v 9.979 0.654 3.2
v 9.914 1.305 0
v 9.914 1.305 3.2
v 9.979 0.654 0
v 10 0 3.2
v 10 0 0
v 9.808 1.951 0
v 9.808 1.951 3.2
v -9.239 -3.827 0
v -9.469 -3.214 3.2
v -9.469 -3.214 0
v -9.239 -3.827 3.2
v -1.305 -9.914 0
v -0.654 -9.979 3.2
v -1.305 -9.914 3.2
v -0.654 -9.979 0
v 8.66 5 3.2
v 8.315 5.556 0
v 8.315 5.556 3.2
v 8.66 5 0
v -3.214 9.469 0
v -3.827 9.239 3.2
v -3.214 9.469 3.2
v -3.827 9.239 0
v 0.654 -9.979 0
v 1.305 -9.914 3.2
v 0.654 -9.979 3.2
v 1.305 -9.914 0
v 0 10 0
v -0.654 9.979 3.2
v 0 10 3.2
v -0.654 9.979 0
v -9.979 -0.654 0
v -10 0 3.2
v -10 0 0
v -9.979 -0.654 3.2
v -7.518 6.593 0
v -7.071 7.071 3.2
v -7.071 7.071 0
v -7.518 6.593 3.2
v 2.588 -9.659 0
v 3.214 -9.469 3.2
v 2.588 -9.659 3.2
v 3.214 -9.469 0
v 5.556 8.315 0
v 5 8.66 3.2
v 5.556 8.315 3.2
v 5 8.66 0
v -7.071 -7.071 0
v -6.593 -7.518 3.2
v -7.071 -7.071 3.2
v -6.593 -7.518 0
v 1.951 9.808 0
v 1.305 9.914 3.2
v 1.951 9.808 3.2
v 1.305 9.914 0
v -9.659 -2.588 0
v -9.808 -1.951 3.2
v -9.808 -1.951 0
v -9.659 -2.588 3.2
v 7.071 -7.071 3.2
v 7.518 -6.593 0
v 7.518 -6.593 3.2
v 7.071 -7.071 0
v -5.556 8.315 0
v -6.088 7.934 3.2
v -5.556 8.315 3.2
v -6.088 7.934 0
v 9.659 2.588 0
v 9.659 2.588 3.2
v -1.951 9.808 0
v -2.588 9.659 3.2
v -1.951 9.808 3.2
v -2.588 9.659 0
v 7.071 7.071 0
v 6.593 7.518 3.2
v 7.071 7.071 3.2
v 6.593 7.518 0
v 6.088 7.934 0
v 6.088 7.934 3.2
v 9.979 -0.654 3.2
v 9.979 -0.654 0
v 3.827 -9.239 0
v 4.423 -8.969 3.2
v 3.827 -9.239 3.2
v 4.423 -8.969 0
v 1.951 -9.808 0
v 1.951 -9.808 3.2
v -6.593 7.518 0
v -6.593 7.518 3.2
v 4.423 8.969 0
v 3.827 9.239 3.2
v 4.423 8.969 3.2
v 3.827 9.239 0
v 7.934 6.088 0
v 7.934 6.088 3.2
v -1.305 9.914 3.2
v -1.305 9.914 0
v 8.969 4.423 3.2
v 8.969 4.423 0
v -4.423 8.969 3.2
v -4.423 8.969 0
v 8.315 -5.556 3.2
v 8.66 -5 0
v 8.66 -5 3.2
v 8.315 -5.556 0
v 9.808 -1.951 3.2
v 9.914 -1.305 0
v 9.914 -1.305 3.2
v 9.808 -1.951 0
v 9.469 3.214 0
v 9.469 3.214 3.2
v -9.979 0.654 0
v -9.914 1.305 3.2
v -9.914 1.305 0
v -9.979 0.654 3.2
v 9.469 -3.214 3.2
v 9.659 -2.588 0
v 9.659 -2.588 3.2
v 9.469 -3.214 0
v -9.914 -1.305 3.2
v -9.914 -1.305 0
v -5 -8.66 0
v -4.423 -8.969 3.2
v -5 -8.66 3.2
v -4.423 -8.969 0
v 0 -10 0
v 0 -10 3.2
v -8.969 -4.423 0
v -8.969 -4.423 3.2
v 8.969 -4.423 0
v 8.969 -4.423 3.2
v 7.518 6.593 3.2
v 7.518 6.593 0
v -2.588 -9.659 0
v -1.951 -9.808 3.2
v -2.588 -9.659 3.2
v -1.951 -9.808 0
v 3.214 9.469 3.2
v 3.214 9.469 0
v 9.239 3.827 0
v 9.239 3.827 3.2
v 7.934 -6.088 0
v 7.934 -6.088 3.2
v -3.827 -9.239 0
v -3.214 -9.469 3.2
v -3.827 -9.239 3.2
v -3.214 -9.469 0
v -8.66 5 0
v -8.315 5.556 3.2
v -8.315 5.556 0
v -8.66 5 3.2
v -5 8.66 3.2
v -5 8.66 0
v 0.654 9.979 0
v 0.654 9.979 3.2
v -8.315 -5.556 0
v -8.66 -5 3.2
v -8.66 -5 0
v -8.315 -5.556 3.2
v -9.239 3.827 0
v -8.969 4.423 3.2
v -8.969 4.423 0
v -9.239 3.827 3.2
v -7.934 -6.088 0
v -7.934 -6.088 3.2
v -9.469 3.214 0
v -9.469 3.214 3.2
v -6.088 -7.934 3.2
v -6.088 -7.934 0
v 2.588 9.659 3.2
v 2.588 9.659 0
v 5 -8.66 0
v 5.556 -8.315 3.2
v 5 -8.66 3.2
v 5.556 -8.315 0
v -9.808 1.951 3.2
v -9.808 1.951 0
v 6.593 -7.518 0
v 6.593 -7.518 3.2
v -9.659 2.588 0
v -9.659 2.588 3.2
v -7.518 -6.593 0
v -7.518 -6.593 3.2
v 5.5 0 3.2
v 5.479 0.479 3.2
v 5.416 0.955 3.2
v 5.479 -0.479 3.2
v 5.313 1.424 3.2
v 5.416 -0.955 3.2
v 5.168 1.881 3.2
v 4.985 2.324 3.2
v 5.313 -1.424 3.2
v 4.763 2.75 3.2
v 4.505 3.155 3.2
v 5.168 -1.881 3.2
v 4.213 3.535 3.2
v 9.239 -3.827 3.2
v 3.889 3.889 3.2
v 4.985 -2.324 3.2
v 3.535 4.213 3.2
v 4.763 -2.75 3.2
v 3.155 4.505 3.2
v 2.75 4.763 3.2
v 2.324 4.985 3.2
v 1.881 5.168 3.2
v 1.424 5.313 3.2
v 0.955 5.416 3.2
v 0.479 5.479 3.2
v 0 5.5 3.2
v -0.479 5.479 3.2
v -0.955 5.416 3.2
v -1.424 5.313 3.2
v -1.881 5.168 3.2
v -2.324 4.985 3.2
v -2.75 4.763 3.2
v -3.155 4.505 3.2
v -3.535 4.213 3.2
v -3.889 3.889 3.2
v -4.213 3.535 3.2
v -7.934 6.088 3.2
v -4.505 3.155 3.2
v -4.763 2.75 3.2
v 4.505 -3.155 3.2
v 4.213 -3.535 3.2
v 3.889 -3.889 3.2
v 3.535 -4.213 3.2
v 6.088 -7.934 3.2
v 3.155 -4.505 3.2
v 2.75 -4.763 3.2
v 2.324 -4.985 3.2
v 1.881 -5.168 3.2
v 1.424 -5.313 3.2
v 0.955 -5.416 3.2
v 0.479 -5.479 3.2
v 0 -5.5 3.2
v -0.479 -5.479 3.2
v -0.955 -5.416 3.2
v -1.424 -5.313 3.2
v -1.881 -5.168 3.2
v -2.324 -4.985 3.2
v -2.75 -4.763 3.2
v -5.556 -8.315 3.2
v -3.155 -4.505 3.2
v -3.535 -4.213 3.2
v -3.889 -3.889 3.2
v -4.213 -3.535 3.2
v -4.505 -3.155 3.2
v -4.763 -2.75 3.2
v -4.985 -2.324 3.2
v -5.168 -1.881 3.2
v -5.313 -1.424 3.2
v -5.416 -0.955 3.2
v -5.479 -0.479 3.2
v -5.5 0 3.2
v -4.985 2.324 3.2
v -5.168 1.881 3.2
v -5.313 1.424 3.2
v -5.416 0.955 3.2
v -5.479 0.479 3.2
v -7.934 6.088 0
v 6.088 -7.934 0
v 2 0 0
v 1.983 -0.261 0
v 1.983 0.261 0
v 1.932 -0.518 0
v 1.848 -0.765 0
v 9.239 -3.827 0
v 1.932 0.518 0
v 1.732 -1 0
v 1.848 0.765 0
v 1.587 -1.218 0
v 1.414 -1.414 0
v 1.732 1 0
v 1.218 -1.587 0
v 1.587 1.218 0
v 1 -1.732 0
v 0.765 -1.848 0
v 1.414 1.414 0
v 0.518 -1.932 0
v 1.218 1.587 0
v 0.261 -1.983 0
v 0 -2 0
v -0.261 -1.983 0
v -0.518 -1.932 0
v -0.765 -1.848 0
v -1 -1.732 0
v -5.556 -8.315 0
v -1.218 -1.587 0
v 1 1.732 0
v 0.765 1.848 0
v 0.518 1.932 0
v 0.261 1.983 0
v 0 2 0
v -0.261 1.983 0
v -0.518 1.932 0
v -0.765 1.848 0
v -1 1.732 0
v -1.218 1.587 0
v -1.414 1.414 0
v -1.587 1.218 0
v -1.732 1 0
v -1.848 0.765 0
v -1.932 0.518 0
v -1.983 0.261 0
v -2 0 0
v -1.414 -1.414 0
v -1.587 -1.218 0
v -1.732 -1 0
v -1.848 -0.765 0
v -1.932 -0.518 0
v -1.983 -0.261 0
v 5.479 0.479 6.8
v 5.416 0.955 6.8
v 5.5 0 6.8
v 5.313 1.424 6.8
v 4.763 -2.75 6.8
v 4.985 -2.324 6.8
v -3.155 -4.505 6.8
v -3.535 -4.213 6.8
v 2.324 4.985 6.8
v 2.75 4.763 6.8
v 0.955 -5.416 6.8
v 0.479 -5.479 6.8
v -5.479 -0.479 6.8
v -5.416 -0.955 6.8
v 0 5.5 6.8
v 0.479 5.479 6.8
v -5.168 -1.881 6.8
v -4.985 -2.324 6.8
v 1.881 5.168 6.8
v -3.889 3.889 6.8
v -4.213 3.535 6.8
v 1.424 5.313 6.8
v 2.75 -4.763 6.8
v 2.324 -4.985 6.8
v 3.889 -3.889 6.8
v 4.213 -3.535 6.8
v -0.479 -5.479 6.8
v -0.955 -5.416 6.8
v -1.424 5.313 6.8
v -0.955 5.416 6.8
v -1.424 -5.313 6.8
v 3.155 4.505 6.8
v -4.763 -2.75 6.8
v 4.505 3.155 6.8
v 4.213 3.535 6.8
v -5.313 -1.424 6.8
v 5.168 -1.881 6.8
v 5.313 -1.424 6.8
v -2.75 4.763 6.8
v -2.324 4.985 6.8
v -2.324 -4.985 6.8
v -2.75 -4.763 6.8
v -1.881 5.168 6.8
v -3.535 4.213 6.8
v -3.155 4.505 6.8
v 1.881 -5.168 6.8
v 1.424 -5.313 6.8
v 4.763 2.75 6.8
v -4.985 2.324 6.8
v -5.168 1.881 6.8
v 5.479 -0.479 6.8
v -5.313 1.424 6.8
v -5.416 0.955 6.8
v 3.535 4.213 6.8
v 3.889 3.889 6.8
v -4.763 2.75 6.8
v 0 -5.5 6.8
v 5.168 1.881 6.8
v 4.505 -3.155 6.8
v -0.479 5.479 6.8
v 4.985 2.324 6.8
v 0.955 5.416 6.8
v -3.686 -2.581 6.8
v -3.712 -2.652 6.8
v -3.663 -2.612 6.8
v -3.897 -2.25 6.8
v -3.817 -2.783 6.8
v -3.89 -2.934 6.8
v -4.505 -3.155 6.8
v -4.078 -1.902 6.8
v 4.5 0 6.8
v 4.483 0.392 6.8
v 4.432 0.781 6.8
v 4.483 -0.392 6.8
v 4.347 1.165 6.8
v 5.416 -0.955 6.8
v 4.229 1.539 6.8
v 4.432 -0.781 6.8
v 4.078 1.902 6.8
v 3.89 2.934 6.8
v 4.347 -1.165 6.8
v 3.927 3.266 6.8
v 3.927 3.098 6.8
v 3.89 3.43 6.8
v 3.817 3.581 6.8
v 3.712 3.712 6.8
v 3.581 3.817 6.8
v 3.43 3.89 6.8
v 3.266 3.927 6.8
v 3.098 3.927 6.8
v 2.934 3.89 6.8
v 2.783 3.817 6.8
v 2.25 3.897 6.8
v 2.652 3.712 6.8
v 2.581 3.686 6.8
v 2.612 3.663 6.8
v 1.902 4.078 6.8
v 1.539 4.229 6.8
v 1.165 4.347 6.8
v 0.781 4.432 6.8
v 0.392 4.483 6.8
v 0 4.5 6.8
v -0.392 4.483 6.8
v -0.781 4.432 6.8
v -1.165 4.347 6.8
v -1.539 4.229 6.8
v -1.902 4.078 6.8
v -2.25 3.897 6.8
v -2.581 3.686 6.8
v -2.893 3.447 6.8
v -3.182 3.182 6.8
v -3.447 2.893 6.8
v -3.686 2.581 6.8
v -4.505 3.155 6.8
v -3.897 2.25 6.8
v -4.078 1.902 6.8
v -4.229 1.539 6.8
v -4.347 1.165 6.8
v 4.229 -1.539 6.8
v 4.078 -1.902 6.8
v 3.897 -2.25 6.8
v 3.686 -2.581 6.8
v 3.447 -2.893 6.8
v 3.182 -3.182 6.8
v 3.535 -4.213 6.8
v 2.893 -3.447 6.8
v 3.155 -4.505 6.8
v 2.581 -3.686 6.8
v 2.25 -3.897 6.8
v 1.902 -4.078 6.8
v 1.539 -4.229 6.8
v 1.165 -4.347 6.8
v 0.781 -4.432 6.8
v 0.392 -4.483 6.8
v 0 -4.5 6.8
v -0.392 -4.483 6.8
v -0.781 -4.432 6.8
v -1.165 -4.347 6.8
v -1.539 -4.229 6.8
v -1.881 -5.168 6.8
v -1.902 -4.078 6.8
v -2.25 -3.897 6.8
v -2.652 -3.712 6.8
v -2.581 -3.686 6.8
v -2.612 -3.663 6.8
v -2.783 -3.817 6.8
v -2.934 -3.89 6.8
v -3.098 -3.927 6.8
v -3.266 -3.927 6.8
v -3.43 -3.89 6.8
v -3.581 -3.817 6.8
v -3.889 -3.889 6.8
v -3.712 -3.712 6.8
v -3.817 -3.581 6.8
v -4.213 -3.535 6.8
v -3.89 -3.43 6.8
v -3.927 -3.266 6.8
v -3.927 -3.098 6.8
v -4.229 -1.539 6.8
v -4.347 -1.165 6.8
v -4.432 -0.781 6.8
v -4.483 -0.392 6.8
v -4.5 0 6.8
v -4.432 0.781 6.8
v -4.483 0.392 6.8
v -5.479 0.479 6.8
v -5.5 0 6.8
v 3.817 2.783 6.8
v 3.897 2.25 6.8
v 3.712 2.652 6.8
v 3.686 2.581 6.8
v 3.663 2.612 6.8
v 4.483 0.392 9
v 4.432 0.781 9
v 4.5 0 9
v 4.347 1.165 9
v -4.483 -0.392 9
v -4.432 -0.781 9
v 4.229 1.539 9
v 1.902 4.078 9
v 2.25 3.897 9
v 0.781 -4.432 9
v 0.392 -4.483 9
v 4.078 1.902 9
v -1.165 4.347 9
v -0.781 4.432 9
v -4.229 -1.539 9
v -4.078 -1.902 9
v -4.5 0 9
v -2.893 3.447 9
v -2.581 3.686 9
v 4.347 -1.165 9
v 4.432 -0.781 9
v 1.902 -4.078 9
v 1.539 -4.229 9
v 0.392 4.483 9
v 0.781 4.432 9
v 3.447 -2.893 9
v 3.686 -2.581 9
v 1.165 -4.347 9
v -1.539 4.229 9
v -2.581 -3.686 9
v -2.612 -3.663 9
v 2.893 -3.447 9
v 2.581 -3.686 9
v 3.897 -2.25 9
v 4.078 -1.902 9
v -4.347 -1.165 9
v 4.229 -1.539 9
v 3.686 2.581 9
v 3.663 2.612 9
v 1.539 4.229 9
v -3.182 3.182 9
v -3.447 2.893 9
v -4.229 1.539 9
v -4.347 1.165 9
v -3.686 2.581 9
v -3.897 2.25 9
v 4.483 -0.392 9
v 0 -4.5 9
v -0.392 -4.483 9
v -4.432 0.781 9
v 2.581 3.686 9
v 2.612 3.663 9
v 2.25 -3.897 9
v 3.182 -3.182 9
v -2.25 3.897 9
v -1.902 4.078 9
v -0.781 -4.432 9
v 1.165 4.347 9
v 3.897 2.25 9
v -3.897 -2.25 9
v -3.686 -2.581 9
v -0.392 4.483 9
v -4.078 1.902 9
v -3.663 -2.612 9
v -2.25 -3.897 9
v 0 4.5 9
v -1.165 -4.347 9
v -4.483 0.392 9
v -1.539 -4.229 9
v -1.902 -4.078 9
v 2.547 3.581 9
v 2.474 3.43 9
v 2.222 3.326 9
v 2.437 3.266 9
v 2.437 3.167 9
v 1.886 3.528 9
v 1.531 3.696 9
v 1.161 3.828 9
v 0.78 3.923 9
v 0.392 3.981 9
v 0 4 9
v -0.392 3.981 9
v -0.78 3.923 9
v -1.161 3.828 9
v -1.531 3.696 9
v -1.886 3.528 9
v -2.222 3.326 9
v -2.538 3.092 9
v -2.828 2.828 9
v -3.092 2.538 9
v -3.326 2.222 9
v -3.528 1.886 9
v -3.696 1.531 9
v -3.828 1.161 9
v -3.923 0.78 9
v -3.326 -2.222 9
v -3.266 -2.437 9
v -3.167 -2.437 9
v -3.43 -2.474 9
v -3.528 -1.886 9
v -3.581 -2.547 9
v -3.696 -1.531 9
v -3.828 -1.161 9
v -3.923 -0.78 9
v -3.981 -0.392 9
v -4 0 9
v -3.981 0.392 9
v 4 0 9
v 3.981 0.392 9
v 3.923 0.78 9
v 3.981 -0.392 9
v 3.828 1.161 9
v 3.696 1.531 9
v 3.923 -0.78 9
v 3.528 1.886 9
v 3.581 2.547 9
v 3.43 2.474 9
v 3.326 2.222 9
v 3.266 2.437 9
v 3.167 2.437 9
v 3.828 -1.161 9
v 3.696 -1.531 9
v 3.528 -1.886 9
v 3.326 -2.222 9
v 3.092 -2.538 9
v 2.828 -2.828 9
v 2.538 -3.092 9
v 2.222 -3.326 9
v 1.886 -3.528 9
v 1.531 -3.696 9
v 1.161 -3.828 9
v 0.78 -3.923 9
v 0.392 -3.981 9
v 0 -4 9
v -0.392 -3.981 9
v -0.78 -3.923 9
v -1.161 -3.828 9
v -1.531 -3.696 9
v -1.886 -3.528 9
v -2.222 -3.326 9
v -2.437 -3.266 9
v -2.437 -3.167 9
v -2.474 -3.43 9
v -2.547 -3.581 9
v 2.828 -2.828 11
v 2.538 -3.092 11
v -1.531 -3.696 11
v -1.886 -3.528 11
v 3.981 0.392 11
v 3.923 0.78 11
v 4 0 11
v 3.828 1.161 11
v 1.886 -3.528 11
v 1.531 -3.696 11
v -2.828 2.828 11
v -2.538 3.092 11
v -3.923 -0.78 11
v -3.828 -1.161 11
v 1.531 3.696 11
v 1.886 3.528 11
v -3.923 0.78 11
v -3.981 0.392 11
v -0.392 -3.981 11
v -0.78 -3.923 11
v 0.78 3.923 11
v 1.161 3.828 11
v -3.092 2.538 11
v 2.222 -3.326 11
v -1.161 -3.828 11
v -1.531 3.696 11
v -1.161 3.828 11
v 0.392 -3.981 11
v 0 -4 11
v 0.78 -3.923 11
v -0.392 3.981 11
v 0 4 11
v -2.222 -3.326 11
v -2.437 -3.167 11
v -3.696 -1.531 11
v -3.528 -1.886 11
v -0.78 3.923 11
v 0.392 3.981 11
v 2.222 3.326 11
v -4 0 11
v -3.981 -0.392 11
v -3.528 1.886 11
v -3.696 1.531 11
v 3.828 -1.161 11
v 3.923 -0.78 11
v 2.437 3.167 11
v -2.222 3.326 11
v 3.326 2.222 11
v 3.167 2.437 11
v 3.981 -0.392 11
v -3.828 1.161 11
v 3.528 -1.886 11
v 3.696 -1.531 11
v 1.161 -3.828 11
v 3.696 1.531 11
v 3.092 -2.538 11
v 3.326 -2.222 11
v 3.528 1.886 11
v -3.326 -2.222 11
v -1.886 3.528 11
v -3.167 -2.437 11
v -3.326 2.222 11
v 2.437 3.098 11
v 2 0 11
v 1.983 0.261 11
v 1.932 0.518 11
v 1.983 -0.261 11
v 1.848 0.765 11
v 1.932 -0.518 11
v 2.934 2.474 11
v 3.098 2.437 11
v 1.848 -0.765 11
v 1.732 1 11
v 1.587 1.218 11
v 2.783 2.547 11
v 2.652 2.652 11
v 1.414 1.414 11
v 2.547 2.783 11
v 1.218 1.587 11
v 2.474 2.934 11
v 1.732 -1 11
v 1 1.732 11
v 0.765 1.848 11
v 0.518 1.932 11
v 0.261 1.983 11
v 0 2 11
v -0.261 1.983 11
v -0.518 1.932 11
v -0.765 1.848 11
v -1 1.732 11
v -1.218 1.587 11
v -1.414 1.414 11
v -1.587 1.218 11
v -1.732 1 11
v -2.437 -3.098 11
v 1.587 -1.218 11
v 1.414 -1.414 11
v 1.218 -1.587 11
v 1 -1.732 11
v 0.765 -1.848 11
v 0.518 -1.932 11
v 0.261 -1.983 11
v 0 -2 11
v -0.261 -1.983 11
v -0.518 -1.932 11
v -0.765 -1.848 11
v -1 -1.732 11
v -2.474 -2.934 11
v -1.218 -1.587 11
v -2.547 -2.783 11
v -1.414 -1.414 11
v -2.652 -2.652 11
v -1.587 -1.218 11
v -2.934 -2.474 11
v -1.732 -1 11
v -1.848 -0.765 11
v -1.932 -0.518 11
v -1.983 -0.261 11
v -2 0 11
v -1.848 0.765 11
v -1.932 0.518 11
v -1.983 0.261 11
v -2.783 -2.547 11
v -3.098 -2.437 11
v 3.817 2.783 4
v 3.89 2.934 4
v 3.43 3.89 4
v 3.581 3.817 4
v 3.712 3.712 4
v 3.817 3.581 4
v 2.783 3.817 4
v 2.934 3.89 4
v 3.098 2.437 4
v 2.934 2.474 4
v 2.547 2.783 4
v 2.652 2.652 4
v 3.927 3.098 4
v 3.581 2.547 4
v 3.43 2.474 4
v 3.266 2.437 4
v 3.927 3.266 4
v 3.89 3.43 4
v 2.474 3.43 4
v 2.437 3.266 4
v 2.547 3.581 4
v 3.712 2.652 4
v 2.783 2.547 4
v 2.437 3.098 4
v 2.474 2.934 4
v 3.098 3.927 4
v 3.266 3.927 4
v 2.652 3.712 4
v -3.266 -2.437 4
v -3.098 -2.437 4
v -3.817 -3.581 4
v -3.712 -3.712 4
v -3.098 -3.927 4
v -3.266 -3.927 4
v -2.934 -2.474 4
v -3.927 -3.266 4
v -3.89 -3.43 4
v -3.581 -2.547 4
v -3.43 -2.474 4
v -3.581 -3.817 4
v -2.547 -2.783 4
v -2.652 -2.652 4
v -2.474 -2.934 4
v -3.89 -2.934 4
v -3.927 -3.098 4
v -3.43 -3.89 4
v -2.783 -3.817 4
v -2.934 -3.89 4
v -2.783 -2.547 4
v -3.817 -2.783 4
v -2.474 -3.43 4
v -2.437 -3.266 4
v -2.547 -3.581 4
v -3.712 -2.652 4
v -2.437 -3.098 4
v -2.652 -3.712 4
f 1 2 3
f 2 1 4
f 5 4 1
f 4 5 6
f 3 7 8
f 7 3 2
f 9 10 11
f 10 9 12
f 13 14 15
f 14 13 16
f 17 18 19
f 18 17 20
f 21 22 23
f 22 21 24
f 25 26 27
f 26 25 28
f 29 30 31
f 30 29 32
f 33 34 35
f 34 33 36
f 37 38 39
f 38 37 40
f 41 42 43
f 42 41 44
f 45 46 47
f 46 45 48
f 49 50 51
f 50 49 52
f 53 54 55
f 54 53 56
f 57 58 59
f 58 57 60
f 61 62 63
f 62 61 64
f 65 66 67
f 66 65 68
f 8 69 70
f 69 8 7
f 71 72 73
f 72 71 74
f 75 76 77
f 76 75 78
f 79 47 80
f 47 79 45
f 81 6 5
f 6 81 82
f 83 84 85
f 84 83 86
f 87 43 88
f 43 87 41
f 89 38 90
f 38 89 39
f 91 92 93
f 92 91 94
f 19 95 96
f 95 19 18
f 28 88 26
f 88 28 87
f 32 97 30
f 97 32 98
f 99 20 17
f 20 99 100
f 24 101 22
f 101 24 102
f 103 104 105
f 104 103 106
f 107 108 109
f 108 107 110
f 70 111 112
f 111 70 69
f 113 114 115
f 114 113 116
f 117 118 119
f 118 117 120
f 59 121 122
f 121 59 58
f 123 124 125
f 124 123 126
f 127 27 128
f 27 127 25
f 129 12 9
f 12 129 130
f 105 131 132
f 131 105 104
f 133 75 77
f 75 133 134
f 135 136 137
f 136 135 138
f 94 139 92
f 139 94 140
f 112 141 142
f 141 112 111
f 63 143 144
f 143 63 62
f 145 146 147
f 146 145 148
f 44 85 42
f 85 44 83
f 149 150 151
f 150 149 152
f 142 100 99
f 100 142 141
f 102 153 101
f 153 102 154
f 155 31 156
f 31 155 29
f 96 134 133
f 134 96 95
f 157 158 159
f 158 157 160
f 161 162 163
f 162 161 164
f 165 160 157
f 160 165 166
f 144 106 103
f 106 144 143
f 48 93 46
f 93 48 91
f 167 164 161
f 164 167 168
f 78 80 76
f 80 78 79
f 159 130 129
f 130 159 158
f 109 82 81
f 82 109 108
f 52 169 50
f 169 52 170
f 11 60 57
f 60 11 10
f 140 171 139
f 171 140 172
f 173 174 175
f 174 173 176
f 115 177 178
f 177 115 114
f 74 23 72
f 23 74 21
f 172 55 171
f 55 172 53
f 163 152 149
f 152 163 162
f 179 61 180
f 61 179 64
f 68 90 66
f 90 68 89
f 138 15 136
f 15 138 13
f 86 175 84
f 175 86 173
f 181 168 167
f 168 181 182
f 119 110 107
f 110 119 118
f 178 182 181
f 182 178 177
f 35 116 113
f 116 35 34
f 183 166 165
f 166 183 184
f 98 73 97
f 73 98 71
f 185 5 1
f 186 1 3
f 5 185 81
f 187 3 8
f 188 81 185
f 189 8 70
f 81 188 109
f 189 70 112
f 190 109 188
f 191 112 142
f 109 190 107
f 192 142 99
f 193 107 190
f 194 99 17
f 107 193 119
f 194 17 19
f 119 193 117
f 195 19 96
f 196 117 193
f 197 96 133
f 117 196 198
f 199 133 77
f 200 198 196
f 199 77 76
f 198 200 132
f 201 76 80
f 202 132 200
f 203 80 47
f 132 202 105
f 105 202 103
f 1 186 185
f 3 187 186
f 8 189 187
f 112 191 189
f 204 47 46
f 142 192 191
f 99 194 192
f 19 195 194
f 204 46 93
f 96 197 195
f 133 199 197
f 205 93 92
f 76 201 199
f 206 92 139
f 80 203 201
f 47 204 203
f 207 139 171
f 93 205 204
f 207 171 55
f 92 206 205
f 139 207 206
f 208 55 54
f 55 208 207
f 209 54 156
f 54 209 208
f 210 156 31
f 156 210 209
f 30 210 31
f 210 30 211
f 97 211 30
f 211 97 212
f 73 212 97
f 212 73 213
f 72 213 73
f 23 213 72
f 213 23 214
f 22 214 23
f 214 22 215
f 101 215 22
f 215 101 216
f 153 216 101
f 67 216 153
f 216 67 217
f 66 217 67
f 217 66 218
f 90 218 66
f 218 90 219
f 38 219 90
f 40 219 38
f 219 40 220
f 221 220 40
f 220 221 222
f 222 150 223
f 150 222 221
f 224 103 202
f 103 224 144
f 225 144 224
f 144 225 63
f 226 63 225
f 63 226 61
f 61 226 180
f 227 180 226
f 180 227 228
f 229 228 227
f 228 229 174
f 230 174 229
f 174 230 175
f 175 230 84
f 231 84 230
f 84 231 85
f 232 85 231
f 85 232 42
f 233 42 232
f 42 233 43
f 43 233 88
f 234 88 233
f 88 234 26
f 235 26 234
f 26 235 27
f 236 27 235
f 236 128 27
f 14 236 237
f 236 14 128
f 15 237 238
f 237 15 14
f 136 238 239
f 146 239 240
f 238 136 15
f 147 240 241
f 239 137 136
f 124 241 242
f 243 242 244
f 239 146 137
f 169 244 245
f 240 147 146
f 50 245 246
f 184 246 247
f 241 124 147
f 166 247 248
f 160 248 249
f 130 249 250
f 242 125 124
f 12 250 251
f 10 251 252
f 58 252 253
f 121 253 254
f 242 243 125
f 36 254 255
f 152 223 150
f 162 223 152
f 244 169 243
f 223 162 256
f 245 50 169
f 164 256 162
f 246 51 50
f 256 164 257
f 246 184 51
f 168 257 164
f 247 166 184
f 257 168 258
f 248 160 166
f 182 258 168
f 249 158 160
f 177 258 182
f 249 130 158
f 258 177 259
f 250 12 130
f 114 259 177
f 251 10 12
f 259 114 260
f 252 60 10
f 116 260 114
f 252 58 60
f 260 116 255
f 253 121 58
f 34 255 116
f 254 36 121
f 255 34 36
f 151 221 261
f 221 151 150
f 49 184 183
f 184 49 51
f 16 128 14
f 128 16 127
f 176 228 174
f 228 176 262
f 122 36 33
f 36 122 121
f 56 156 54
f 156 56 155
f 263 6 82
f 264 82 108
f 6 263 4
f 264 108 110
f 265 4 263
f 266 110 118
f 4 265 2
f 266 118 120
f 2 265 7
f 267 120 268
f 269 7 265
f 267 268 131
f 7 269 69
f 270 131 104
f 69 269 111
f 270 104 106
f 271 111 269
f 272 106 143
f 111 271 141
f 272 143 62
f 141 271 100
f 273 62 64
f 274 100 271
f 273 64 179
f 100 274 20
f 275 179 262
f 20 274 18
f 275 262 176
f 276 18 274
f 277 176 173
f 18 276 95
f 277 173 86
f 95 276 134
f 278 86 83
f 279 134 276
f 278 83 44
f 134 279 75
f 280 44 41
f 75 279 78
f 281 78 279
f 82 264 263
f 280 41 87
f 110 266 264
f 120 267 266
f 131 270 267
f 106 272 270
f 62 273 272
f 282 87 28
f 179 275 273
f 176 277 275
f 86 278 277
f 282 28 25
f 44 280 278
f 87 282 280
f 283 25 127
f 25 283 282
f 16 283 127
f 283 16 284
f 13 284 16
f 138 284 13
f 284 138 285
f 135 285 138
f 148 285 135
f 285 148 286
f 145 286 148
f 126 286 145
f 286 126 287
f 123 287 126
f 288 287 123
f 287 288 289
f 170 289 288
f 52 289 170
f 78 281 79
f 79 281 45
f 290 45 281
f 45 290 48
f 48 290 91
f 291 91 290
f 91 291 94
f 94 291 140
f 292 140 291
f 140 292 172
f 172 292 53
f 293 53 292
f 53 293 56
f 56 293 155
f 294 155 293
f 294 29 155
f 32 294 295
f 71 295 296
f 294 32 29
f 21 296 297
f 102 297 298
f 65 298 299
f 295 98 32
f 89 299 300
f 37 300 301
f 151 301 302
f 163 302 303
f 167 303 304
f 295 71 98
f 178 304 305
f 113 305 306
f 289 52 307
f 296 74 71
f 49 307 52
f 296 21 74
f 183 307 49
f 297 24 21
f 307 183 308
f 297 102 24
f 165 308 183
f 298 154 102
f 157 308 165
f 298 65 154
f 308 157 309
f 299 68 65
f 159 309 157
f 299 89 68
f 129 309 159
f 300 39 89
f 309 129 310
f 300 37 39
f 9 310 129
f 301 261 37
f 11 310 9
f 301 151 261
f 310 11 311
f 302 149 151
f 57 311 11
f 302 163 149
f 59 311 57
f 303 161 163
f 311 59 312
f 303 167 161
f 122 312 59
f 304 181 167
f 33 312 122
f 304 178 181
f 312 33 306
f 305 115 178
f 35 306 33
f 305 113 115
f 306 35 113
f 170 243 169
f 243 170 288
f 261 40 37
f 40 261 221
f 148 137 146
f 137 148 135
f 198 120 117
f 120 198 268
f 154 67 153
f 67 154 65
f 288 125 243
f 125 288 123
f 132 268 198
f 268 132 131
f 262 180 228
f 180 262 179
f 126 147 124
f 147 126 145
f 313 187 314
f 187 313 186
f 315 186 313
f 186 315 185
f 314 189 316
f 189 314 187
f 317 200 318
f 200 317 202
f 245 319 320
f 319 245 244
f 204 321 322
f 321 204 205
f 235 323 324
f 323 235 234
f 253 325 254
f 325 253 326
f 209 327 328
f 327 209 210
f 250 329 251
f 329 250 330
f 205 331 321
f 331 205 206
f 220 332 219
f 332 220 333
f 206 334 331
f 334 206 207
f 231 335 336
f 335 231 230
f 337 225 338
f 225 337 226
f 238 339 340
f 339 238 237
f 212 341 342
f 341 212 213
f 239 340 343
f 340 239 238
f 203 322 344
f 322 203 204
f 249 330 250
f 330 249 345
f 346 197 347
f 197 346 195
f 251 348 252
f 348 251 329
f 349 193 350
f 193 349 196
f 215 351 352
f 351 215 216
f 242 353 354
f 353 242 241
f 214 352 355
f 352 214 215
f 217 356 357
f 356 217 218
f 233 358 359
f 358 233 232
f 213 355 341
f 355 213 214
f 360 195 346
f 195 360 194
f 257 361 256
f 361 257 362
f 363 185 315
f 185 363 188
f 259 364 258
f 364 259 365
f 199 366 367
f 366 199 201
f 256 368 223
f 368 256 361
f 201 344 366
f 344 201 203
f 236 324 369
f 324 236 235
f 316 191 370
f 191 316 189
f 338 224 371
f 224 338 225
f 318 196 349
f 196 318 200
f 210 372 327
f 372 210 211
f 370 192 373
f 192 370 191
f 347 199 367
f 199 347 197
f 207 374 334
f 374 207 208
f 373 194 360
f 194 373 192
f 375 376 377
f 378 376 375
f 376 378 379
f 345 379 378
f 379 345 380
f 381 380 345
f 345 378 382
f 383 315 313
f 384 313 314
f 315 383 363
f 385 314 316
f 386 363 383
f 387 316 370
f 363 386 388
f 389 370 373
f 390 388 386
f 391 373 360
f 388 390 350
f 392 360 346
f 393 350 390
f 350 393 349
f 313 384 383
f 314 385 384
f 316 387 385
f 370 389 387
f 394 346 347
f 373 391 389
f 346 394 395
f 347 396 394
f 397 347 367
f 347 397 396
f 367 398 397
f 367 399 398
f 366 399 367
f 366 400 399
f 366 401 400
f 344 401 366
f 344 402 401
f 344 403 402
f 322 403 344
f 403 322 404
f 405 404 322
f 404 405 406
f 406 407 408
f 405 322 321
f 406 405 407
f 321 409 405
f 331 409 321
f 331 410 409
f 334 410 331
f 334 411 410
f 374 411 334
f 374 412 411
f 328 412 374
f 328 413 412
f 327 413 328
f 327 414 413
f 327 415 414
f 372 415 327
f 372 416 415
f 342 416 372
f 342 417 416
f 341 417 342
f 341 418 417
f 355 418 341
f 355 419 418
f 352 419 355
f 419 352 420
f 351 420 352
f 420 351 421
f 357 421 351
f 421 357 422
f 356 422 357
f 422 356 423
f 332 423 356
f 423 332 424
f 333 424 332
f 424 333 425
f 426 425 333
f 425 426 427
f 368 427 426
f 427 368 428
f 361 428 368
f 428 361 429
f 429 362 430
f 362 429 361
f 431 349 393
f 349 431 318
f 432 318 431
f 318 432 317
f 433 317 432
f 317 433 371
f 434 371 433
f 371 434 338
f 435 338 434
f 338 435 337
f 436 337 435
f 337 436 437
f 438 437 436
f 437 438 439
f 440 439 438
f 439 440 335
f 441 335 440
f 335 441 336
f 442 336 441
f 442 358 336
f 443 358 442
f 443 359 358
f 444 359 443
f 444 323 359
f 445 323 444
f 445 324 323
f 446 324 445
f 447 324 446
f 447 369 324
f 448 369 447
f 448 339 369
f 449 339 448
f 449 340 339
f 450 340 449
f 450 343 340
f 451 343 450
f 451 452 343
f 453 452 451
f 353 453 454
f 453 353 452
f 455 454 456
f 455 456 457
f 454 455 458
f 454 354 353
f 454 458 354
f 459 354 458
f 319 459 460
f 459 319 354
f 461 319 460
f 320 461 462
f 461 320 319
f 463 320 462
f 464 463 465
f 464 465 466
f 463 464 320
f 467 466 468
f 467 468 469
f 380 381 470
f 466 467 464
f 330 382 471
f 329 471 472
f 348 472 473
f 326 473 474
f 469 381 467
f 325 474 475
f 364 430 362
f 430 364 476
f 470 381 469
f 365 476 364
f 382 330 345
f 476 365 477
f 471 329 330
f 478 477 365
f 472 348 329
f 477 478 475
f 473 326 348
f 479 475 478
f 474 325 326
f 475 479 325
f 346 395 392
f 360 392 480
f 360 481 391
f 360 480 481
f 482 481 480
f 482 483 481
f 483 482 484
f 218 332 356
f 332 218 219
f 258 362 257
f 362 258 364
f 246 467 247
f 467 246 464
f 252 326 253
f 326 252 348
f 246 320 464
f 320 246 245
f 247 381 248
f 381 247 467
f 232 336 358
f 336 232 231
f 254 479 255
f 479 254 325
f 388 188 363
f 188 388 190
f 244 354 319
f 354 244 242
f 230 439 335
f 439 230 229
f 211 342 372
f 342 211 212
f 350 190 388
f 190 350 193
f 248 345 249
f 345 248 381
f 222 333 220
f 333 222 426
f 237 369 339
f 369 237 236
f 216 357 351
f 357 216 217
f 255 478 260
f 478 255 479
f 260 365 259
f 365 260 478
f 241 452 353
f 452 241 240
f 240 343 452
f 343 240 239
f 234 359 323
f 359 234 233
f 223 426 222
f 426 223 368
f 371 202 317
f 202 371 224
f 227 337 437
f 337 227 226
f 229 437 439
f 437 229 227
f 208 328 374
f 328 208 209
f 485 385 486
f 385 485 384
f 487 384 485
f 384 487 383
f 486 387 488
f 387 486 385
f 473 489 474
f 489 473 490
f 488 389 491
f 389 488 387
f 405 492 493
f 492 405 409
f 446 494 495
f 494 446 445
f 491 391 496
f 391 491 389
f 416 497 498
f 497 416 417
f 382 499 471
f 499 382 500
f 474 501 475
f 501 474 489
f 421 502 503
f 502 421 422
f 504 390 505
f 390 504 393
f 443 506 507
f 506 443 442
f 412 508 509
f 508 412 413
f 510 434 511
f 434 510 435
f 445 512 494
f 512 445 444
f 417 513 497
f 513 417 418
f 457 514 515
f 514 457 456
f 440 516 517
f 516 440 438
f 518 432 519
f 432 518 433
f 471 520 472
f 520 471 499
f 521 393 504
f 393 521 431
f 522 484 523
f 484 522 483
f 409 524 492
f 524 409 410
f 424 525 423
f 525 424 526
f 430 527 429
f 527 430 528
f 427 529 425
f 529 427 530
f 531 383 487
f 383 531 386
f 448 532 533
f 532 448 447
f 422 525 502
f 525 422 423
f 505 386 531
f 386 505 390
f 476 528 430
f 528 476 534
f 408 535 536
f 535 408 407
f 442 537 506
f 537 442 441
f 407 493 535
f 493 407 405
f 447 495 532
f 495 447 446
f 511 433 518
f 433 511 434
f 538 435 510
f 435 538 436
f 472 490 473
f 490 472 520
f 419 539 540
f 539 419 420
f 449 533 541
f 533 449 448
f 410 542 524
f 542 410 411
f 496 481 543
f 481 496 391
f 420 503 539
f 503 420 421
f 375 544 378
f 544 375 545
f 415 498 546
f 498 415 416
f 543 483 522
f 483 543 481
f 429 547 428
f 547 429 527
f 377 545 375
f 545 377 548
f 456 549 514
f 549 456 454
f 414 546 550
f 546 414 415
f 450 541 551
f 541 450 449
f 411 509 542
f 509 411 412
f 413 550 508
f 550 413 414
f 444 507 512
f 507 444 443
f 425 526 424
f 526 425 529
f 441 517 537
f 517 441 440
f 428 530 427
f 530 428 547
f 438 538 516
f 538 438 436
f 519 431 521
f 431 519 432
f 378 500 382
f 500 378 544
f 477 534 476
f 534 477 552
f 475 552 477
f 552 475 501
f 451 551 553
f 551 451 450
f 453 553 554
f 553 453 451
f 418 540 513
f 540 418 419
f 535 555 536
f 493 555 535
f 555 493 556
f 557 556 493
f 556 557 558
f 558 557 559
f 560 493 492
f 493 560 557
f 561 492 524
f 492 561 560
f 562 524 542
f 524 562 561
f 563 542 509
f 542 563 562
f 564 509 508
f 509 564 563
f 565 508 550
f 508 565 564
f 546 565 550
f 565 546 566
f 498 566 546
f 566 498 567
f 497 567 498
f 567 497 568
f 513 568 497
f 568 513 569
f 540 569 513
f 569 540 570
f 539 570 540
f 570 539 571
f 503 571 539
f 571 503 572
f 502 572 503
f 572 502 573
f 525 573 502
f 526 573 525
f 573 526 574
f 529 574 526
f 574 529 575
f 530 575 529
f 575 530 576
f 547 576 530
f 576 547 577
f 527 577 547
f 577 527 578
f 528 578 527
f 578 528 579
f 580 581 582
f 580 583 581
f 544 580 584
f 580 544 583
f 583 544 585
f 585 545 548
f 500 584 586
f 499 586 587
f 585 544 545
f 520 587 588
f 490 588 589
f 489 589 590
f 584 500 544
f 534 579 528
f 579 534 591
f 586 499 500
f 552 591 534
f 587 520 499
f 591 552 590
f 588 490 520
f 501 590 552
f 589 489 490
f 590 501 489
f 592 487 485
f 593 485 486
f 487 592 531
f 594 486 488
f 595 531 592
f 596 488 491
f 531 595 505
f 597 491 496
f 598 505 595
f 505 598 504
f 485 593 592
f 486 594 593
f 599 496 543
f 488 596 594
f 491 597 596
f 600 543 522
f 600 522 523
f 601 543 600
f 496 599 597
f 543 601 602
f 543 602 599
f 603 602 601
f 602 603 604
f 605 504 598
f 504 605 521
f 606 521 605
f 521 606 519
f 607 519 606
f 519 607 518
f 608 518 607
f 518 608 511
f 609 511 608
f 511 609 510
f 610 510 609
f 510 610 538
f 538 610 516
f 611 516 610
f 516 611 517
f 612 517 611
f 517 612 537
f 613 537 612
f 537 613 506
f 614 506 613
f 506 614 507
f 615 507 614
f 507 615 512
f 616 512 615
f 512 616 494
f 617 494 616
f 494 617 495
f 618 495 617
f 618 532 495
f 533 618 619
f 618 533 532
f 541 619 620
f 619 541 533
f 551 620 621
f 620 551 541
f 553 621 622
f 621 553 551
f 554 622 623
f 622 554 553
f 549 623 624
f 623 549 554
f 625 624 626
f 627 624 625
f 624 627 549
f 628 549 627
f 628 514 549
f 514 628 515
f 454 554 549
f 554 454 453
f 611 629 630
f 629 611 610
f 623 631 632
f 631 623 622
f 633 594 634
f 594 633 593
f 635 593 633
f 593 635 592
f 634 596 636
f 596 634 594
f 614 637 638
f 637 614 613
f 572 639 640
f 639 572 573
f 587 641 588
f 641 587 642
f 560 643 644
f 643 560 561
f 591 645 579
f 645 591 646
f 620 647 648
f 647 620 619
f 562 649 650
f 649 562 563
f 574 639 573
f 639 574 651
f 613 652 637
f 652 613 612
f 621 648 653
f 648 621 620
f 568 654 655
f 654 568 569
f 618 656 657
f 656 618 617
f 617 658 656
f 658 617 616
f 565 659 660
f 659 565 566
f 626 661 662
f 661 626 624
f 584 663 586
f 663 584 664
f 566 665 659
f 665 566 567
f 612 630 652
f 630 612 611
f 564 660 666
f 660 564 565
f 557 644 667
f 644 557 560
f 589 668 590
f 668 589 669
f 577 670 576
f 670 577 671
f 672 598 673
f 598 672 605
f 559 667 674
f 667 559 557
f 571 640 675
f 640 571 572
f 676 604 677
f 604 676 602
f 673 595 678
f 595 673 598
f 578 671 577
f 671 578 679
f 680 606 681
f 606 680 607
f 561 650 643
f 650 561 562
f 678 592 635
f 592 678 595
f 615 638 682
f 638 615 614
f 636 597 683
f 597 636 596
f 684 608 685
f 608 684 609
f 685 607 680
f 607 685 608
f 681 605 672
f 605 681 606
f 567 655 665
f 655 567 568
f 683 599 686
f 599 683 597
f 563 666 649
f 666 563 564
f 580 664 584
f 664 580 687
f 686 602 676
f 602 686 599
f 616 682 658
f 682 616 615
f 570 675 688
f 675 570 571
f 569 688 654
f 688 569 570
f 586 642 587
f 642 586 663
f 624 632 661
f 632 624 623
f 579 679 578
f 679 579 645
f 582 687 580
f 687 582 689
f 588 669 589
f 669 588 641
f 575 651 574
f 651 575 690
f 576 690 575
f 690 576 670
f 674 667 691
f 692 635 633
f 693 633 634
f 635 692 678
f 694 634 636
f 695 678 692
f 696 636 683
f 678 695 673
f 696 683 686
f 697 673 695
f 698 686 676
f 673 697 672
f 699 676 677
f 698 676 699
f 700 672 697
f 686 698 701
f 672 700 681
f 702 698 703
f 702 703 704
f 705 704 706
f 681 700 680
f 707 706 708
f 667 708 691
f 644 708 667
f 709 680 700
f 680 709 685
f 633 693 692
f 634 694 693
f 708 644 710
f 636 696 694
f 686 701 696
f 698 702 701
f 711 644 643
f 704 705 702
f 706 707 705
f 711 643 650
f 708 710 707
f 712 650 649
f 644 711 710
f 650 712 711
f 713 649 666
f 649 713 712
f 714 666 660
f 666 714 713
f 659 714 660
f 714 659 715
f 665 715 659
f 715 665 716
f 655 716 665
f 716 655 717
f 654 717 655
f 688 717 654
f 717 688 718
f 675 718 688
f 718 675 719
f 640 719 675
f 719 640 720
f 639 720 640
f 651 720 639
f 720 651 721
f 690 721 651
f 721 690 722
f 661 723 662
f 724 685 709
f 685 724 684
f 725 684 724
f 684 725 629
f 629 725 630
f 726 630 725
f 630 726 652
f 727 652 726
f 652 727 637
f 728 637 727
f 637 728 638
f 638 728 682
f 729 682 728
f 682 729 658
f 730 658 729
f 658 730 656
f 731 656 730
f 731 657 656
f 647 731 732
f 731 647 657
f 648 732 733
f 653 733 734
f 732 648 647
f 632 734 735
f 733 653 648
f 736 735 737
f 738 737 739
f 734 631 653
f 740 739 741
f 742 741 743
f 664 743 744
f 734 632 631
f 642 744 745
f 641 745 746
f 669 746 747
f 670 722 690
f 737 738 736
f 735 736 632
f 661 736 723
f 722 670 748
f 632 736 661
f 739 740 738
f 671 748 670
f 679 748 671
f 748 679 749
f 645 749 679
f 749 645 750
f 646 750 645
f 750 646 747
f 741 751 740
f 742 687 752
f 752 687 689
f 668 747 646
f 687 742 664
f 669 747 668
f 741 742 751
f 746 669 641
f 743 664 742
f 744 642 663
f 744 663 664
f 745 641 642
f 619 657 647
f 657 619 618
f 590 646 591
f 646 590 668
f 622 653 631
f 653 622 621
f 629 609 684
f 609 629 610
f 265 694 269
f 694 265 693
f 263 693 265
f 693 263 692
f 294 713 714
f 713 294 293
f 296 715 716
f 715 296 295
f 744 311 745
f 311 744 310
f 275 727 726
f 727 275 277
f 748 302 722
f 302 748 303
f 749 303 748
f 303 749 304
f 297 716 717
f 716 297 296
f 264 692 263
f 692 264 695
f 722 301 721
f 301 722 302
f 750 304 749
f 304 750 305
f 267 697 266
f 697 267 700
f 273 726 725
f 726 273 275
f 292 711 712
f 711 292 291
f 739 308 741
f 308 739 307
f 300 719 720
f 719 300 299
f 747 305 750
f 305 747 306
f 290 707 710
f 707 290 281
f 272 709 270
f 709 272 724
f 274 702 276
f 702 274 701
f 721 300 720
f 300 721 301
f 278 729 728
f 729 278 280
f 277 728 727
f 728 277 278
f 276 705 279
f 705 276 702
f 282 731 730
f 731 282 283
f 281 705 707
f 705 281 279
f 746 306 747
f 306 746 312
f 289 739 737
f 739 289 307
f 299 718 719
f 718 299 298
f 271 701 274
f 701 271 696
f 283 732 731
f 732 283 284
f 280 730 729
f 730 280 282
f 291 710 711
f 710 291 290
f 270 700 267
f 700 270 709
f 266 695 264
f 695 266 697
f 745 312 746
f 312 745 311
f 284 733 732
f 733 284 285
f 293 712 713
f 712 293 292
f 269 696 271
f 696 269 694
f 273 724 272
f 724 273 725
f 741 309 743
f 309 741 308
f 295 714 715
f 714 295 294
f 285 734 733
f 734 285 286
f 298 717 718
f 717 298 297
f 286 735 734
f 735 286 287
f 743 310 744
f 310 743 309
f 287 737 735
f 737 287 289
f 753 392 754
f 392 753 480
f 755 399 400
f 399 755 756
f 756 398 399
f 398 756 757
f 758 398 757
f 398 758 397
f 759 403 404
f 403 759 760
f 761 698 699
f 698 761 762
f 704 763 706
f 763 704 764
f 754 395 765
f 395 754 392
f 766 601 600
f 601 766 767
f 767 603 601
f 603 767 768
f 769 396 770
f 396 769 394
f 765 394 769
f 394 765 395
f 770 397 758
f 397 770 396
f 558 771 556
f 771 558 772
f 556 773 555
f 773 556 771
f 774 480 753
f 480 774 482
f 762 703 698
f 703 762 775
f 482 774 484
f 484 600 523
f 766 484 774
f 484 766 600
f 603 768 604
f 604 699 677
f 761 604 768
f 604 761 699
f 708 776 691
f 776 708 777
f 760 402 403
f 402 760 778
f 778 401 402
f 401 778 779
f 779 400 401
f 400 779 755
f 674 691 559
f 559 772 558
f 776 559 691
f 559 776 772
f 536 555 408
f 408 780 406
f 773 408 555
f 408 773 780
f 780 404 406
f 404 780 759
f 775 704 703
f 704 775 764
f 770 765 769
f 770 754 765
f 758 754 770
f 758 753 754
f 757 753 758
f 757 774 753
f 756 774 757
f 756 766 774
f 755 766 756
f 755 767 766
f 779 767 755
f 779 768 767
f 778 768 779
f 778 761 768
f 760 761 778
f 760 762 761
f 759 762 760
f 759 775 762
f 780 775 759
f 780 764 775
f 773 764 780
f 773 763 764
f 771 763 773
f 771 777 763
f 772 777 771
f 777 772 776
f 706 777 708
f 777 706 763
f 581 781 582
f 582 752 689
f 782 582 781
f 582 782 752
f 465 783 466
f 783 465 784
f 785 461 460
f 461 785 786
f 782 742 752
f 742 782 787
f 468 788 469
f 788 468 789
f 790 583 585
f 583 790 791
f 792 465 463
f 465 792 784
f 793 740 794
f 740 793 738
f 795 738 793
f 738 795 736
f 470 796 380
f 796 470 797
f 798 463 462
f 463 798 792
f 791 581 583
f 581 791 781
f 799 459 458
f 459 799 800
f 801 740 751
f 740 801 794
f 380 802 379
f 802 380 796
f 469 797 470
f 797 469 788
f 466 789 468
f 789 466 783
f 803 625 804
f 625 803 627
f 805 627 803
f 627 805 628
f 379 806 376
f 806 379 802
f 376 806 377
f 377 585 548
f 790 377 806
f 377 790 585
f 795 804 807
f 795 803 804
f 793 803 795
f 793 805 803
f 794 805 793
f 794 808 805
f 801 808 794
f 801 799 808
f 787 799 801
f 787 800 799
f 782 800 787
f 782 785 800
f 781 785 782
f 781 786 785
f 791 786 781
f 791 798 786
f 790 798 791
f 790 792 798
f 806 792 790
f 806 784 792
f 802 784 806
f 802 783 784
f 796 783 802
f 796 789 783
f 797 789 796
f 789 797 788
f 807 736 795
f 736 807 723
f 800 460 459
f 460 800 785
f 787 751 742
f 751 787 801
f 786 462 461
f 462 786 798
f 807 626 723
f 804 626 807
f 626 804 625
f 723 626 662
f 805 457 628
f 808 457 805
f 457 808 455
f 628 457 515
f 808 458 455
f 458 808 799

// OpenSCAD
// part_id: b7
// name: B7 hub base
// source_drawing_ids: DRW-002
// units: mm
// revision: 0.1
// SPDX-License-Identifier: MIT

// Axis is +Z. Geometry is a stepped turned hub with rivet holes for b8/b9.
module part_b7(base_d = 20, base_h = 3.2,
               step1_d = 11, step1_h = 3.6,
               step2_d = 9,  step2_h = 2.2,
               step3_d = 8,  step3_h = 2.0,
               top_post_d = 4.0, top_post_h = 1.9,
               bore_d = 4.0,
               rivet_d = 1.5,
               rivet_pitch = 9.0) {
    total_h = base_h + step1_h + step2_h + step3_h + top_post_h;

    difference() {
        union() {
            cylinder(d = base_d, h = base_h, center = false, $fn = 96);
            translate([0, 0, base_h]) cylinder(d = step1_d, h = step1_h, center = false, $fn = 72);
            translate([0, 0, base_h + step1_h]) cylinder(d = step2_d, h = step2_h, center = false, $fn = 72);
            translate([0, 0, base_h + step1_h + step2_h]) cylinder(d = step3_d, h = step3_h, center = false, $fn = 64);
            translate([0, 0, base_h + step1_h + step2_h + step3_h]) cylinder(d = top_post_d, h = top_post_h, center = false, $fn = 48);
        }

        // Main through bore.
        translate([0, 0, -0.1]) cylinder(d = bore_d, h = total_h + 0.3, center = false, $fn = 48);

        // b8/b9 rivet holes near the top shoulder.
        for (a = [45, 225])
            rotate([0, 0, a])
                translate([rivet_pitch / 2, 0, base_h + 0.8])
                    cylinder(d = rivet_d, h = step1_h + step2_h + 1.2, center = false, $fn = 28);
    }
}

// ---- "main guard" ----
// Default to previewing when opened directly:
if (is_undef(__LIB_MODE__)) {
    part_b7();
}
